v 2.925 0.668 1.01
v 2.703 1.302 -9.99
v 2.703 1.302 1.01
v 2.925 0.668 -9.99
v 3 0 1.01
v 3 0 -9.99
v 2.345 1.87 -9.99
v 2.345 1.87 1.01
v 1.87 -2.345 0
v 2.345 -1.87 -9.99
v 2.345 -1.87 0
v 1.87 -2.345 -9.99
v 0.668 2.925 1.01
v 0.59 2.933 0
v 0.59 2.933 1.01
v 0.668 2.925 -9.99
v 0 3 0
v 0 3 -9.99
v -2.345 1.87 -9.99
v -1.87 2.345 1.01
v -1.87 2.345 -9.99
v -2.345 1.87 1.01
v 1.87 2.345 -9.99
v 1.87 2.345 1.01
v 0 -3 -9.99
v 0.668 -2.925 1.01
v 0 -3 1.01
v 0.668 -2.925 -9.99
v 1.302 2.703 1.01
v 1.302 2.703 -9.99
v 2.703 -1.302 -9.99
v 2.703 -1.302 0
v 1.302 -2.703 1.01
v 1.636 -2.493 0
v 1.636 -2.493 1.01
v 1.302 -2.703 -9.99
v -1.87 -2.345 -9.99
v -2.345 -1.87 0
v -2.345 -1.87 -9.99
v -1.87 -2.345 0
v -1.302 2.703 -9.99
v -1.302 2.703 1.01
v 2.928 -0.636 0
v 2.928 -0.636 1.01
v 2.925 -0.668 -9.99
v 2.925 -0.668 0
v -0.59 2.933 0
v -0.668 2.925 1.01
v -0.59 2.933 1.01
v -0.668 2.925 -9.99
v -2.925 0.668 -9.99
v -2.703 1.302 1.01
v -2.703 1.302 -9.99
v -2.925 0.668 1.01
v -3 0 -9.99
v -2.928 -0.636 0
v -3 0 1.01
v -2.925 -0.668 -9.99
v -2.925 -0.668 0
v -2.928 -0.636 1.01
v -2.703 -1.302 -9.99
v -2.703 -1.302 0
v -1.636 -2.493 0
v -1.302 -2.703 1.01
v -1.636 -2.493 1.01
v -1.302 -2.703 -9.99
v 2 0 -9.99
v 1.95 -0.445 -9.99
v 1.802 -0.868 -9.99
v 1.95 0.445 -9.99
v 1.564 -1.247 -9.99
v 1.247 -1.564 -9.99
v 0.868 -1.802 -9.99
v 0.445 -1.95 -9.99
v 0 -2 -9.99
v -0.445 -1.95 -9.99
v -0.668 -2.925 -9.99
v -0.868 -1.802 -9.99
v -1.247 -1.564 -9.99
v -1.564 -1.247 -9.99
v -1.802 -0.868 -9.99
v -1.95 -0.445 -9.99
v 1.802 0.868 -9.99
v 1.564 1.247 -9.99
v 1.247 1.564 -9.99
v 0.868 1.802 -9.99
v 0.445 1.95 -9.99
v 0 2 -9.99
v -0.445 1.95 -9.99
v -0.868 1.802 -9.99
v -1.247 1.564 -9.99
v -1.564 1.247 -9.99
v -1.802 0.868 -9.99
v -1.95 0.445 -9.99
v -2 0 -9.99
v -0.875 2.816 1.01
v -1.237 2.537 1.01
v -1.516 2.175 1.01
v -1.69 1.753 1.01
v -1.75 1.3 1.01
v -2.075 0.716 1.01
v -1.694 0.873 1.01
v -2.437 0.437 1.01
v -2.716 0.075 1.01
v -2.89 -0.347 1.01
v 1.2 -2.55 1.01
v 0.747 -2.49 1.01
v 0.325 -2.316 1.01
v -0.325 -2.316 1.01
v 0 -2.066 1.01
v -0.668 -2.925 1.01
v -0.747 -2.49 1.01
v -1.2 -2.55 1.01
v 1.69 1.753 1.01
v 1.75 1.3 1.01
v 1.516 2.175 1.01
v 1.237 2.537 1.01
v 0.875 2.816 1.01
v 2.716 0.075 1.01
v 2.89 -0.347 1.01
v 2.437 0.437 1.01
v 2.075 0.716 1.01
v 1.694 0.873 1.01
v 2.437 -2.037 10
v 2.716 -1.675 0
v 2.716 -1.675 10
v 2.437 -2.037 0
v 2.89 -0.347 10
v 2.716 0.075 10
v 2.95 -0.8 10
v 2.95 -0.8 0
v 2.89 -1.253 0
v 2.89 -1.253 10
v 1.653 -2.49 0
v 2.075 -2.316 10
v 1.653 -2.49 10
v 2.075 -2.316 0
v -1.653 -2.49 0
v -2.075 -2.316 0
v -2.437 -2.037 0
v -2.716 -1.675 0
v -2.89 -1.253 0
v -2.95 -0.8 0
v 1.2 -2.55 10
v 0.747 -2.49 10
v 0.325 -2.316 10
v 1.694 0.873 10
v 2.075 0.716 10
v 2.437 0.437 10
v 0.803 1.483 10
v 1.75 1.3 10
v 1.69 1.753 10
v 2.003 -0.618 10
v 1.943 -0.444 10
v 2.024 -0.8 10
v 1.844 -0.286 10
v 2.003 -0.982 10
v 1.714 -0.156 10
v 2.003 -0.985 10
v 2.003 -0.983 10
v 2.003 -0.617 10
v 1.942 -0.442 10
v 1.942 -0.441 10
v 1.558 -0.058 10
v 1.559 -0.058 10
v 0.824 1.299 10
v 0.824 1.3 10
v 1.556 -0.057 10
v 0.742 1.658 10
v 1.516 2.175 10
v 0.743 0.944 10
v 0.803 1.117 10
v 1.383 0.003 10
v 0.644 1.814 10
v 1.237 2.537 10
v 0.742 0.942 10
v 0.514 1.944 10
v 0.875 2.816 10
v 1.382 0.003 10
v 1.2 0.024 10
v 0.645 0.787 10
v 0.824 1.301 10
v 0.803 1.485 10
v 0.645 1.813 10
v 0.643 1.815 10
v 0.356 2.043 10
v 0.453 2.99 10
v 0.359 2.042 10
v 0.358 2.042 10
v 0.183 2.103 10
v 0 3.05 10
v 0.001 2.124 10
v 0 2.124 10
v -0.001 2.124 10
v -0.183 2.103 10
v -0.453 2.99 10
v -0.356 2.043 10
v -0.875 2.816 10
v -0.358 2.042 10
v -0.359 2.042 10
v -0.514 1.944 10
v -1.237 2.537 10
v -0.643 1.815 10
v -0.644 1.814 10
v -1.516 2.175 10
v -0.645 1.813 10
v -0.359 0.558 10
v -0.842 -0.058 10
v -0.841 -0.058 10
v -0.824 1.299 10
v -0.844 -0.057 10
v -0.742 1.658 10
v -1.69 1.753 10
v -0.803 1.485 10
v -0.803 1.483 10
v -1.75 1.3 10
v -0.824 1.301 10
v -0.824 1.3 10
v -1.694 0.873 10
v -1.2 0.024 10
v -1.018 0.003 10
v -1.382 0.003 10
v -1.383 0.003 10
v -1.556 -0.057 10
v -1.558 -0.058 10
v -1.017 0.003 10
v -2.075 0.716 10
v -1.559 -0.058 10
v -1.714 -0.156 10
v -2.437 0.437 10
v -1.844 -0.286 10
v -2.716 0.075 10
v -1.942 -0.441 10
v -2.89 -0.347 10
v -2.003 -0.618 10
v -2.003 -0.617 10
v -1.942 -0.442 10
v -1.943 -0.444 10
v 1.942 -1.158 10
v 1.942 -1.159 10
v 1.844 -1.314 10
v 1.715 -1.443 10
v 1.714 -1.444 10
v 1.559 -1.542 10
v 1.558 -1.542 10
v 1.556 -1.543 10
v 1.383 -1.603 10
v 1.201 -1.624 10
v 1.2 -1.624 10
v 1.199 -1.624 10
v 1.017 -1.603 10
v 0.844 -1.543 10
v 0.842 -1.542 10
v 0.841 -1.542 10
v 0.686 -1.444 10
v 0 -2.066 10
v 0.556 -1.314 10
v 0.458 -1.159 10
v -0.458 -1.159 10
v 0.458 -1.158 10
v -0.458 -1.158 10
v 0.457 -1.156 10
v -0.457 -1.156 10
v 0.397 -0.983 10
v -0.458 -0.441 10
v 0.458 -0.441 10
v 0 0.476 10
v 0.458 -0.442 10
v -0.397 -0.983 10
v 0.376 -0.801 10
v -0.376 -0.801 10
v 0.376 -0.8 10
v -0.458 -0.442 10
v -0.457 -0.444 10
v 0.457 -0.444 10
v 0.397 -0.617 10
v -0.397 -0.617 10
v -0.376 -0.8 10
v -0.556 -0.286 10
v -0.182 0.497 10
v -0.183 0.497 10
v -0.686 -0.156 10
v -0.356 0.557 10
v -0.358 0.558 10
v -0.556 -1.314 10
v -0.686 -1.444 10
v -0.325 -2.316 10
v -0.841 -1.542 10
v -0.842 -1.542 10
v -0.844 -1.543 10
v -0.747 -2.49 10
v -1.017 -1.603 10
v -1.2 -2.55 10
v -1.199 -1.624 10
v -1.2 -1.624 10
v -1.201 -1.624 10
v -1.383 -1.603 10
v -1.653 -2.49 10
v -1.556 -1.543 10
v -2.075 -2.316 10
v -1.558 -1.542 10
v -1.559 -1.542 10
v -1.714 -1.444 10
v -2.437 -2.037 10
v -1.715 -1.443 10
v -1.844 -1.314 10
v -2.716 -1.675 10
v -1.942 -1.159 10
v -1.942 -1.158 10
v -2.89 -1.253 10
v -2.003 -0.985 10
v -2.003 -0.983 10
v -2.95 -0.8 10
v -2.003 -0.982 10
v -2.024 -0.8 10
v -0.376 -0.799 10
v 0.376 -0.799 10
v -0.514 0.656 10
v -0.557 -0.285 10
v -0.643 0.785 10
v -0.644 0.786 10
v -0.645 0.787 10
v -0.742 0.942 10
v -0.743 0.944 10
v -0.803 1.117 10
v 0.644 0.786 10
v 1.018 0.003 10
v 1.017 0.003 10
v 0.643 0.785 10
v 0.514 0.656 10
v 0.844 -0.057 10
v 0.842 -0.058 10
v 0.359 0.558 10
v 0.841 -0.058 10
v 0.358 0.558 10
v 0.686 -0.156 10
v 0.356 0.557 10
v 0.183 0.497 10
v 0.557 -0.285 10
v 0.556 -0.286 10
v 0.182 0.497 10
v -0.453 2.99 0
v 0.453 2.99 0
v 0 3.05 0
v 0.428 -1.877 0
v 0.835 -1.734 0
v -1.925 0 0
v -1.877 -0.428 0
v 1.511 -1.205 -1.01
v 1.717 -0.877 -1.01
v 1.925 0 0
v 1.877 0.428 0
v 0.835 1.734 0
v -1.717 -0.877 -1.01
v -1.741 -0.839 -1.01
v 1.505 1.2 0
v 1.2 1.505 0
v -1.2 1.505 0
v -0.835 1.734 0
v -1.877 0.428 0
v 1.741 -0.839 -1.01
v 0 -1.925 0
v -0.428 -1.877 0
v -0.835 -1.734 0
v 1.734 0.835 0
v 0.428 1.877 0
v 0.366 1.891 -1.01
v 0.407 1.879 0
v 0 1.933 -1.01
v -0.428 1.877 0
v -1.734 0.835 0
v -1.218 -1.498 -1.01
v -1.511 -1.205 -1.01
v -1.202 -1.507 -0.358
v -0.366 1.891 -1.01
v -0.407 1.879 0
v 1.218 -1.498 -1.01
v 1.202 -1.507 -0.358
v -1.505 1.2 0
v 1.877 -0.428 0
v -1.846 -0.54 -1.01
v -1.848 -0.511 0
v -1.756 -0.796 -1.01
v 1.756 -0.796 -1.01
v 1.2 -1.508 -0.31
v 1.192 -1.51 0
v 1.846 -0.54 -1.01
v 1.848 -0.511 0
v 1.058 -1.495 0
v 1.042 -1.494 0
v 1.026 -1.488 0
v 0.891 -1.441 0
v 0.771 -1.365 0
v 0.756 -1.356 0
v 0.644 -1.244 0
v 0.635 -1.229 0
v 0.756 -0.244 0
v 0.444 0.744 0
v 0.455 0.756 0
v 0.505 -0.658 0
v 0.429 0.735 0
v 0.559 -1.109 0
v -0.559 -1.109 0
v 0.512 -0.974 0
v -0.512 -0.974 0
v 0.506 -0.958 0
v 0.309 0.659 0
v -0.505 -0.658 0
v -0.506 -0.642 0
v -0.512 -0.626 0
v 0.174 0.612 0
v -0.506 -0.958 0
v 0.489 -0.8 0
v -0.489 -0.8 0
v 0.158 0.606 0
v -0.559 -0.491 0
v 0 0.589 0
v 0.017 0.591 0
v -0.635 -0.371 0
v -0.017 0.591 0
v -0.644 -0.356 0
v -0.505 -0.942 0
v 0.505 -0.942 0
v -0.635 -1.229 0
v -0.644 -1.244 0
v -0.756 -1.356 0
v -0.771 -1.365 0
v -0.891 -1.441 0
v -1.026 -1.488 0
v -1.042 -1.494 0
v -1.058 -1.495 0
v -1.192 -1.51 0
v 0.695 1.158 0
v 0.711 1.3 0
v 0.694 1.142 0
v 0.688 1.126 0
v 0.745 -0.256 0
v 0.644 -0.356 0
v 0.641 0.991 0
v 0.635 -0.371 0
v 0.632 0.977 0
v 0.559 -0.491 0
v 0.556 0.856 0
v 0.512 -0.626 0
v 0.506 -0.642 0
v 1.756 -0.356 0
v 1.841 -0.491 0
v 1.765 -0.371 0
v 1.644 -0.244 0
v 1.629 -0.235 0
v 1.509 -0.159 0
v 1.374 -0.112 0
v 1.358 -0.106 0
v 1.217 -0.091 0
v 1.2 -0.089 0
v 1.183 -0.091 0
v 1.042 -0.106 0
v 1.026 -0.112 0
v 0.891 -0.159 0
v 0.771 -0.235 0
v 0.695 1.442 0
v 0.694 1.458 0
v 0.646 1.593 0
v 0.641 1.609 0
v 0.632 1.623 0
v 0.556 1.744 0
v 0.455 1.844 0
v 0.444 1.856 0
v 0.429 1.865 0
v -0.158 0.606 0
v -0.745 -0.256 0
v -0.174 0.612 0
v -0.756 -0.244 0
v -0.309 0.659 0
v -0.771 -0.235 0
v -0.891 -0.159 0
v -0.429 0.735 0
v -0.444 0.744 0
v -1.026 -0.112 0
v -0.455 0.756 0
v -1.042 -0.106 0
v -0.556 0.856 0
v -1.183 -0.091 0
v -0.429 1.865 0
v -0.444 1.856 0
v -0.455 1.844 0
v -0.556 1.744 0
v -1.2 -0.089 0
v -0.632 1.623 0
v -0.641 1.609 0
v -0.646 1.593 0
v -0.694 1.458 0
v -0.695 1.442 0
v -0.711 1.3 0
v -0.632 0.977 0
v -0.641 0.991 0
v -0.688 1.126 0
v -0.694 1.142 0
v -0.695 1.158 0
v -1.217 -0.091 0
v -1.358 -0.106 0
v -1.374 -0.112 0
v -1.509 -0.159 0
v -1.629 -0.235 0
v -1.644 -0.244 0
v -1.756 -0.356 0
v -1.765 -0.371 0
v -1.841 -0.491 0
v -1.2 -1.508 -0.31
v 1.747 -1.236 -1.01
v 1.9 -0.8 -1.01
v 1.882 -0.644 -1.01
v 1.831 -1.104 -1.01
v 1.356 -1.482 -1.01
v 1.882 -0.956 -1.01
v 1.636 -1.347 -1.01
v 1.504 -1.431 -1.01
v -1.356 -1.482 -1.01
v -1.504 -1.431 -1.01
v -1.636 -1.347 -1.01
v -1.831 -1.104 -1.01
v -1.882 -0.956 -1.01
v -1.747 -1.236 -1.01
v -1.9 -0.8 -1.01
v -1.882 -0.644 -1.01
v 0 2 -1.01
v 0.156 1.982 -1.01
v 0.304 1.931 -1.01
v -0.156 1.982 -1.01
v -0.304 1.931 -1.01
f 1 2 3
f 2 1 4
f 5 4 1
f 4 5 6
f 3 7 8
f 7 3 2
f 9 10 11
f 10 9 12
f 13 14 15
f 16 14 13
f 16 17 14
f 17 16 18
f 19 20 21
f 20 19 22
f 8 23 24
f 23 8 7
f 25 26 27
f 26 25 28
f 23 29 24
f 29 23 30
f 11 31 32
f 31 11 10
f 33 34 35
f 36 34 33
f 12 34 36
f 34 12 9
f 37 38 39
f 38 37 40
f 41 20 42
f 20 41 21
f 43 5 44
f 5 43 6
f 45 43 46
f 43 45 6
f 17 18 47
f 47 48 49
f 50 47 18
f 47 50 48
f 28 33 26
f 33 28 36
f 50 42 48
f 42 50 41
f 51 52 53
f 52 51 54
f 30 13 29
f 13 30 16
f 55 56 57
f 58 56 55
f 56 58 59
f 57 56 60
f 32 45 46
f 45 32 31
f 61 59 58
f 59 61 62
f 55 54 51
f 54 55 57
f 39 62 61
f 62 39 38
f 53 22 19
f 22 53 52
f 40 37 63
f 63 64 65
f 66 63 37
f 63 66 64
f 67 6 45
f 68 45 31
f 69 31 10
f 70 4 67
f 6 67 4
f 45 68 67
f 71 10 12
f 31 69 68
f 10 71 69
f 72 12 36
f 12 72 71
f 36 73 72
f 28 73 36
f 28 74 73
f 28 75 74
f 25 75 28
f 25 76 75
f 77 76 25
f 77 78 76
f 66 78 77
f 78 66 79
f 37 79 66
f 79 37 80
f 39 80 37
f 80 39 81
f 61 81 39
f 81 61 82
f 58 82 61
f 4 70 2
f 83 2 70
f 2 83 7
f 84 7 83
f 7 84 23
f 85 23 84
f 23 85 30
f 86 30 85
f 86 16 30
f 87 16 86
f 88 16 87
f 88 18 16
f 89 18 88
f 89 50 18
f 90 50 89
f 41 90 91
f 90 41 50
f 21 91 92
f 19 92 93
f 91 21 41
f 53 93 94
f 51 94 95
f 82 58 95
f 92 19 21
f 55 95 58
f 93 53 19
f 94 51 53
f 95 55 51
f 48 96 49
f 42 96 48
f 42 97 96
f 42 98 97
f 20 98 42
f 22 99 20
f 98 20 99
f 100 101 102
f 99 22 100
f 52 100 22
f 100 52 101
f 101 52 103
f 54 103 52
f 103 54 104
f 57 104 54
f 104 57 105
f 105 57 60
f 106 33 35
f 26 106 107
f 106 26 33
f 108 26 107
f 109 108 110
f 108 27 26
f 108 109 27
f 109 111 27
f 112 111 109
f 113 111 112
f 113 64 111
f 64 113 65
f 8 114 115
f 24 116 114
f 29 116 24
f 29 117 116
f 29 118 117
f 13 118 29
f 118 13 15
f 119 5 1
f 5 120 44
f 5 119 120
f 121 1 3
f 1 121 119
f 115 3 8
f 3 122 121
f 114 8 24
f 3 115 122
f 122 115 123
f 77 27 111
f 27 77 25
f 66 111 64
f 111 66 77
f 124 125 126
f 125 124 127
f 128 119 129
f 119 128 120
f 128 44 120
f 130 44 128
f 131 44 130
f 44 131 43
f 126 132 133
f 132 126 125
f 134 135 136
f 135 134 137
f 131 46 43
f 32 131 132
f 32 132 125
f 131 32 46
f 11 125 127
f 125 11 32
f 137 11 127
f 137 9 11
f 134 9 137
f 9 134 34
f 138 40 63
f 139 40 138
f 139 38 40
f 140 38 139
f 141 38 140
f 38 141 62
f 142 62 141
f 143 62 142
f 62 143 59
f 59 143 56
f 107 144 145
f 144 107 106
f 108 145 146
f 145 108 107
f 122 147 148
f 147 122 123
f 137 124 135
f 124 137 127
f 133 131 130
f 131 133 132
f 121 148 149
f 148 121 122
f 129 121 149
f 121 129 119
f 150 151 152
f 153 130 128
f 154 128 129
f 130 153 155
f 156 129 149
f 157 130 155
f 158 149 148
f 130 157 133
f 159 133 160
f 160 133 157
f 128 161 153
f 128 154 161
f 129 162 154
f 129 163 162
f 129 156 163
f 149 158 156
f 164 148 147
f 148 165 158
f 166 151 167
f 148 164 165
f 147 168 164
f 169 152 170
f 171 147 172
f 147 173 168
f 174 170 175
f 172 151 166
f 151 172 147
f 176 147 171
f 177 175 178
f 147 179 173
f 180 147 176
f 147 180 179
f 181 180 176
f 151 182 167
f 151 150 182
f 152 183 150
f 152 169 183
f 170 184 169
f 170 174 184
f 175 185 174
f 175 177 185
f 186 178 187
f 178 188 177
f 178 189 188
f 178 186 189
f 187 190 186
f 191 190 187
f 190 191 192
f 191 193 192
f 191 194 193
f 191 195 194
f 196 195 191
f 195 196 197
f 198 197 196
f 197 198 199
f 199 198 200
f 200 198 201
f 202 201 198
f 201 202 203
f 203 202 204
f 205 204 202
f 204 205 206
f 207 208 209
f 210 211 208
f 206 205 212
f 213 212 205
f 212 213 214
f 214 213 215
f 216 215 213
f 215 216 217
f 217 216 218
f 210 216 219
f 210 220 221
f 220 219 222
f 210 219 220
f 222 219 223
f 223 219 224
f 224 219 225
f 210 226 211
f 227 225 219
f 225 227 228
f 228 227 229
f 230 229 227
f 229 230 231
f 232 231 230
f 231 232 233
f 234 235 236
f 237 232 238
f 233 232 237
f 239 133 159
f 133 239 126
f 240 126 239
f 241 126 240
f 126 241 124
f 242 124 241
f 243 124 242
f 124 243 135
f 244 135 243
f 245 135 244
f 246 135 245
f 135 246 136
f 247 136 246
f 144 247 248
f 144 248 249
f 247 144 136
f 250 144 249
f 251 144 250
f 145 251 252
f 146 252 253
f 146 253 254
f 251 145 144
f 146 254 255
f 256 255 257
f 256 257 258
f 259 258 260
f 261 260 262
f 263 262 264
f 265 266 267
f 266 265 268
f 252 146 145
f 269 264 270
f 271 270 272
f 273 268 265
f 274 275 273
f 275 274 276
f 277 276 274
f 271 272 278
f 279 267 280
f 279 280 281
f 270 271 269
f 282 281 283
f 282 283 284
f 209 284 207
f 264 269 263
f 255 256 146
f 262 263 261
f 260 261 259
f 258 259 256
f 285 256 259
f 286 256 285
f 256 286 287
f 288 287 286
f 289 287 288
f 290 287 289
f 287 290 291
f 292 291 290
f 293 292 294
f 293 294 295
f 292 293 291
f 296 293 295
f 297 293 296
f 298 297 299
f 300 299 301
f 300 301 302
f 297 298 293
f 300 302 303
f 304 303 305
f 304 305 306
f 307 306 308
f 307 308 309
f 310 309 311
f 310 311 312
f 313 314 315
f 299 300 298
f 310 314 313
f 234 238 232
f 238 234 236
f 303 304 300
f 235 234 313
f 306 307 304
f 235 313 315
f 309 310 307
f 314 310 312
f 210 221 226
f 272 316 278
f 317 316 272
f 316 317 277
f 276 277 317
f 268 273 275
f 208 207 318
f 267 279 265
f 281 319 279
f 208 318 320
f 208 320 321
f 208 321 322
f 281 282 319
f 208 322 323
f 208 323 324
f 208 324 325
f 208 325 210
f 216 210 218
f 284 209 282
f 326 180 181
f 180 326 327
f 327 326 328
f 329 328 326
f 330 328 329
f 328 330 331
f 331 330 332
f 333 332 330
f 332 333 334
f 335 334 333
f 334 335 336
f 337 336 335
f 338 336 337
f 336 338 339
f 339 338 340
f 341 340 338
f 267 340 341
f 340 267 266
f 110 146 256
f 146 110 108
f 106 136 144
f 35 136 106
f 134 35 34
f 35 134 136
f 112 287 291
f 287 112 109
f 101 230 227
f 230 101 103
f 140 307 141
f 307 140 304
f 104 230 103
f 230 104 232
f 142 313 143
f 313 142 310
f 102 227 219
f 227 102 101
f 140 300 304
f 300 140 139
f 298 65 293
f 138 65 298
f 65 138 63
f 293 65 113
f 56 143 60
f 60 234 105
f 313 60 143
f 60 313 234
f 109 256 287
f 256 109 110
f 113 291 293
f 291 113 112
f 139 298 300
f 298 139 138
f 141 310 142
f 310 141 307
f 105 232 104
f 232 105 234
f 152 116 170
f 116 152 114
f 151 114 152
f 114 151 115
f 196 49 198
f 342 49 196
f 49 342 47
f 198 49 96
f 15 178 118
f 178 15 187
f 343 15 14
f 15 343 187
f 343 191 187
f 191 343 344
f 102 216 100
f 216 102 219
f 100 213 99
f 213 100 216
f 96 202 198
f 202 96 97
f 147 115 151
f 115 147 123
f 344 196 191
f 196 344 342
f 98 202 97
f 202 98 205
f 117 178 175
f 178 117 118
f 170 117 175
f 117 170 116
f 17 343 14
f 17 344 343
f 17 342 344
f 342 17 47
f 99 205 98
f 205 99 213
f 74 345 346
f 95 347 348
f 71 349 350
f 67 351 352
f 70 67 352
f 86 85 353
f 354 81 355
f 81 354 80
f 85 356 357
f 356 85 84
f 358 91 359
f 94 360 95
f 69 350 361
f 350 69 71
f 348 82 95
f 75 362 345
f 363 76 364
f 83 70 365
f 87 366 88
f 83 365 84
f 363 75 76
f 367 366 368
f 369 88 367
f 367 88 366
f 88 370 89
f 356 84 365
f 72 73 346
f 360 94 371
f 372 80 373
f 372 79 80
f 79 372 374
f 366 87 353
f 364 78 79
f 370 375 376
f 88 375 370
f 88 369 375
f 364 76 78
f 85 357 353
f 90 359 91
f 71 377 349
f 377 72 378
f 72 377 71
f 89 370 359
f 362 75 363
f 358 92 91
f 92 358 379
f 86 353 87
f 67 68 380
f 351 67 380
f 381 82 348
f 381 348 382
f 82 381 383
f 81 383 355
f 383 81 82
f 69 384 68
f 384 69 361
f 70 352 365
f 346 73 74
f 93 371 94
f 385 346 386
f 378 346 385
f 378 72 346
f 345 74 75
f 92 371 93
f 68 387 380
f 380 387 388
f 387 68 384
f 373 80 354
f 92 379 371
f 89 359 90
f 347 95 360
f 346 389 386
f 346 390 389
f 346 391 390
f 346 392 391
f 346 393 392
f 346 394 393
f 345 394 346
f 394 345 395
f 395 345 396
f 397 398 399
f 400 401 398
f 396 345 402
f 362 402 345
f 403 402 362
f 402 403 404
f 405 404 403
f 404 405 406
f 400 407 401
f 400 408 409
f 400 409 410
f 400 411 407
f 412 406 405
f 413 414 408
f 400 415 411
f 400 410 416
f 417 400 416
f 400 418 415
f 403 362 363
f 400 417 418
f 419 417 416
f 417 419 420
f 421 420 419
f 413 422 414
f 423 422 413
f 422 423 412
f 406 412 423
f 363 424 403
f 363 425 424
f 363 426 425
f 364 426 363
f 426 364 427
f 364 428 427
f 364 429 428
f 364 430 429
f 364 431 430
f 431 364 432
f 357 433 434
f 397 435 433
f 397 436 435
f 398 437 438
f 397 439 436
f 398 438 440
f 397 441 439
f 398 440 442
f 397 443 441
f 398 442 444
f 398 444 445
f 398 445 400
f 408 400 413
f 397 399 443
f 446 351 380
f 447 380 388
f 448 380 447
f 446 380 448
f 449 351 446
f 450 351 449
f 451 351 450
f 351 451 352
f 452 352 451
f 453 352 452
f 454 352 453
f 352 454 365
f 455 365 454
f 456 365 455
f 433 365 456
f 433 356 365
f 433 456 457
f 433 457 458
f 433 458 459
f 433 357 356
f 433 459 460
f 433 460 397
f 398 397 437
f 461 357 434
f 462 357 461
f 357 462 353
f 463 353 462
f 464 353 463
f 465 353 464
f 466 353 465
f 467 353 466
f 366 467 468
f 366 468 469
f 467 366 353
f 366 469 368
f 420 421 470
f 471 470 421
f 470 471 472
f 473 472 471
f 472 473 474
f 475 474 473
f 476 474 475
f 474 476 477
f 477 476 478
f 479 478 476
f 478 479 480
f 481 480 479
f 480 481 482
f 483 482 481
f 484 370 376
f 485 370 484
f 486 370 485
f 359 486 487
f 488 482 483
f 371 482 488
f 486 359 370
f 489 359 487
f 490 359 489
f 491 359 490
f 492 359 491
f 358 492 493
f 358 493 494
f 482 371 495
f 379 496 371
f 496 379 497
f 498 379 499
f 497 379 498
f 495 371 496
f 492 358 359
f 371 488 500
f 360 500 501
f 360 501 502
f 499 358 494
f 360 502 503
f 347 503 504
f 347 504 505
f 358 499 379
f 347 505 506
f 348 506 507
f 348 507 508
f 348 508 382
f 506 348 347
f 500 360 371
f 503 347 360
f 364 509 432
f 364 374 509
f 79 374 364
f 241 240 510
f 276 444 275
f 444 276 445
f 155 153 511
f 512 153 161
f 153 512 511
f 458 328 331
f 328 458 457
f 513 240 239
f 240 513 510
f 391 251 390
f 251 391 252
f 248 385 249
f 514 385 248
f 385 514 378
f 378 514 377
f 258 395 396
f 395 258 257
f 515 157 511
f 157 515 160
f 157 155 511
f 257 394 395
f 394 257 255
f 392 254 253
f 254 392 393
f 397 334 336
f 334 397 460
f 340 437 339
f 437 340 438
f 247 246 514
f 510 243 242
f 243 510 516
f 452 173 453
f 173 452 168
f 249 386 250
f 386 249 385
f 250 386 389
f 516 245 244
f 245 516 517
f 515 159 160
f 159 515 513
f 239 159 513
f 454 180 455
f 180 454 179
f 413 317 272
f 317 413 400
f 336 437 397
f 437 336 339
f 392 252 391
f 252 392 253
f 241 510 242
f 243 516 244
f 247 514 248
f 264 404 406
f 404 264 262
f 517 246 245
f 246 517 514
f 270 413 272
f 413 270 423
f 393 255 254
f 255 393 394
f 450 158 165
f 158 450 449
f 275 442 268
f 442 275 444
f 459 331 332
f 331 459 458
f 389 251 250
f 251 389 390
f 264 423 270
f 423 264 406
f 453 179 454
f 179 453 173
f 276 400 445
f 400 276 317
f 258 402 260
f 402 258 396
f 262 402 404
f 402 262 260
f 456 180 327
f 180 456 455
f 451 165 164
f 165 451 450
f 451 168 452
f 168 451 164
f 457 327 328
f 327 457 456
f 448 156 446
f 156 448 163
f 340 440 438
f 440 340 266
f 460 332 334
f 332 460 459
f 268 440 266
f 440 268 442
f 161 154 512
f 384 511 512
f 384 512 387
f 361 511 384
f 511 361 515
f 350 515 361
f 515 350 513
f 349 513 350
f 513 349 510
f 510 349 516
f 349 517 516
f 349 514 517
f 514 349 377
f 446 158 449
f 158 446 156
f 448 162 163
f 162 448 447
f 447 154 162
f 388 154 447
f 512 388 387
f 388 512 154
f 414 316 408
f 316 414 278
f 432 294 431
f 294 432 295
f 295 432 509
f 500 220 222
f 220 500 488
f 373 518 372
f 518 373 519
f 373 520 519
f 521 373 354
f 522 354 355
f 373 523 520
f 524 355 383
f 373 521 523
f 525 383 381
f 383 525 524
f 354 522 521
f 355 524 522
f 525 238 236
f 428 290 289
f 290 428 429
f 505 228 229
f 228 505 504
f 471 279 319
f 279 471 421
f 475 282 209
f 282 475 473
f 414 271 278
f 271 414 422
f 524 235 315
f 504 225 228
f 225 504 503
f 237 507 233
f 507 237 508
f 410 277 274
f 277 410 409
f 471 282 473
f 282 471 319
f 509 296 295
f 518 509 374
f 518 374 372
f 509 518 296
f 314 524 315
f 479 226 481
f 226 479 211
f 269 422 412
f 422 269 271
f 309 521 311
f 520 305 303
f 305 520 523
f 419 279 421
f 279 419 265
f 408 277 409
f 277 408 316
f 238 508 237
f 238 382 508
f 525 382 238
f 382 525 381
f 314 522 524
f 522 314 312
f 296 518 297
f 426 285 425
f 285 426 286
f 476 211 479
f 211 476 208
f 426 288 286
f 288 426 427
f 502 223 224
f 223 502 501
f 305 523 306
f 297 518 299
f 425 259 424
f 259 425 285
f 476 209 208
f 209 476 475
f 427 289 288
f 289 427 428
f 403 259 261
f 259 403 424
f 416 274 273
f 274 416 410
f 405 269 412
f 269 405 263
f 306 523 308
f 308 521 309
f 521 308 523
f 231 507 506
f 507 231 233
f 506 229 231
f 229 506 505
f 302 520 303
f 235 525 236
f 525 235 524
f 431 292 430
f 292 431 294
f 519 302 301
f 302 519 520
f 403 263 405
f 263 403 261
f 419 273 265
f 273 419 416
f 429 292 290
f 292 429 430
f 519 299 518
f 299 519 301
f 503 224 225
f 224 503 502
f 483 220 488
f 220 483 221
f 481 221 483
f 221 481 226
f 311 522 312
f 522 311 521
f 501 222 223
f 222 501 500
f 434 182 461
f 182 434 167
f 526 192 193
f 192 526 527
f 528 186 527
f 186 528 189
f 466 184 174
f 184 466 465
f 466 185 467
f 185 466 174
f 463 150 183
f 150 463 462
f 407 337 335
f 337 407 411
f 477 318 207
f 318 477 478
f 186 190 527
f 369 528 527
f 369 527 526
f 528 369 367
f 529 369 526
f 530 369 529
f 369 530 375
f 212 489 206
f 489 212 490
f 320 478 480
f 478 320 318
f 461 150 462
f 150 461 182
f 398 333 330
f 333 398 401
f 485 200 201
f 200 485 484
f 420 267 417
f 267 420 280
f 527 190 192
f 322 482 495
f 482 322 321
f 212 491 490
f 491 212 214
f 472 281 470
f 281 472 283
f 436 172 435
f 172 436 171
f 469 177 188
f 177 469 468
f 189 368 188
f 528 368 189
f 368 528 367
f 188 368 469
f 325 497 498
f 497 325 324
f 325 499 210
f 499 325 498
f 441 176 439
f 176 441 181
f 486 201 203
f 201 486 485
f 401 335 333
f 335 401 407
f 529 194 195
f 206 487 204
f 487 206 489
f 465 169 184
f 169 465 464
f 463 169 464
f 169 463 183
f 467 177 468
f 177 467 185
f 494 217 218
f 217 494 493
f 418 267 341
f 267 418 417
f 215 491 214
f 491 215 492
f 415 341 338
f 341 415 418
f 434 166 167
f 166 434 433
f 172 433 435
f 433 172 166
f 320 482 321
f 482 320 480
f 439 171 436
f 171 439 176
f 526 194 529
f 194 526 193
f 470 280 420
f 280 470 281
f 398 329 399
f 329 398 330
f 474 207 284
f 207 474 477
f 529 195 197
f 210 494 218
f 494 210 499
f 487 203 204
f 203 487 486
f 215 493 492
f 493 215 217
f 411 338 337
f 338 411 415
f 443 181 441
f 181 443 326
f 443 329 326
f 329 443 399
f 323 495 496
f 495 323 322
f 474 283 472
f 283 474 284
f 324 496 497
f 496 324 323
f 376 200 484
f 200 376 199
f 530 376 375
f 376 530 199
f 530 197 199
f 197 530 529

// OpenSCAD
module tube1(){
    difference(){
        union(){
            translate([0,0,-9.99])
                cylinder(d=6,h=11,$fn=28);
                
            cylinder(d=3.5,h=10,$fn=24);
        }
        translate([0,0,-10])
            cylinder(d1=4,d2=3.85,h=10,$fn=28);
        
        translate([0,0,-1.01])
            cylinder(d1=1.4,d2=1.55,h=11.1,$fn=28);
    }
}

module tube2(){
    bias=1.2;
    difference(){
        union(){
            translate([0,0,-9.99])
                cylinder(d=6,h=11,$fn=28);
            translate([bias,-0.8,0])    
                cylinder(d=3.5,h=10,$fn=24);
            translate([-bias,-0.8,0])    
                cylinder(d=3.5,h=10,$fn=24);
            translate([0,1.3,0])    
                cylinder(d=3.5,h=10,$fn=24);
        }
        translate([0,0,-10])
            cylinder(d1=4,d2=3.85,h=10,$fn=28);
        
        translate([bias,-0.8,-1.01])
            cylinder(d1=1.4,d2=1.65,h=11.1,$fn=28);
        translate([-bias,-0.8,-1.01])
            cylinder(d1=1.4,d2=1.65,h=11.1,$fn=28);
        translate([0,1.3,-1.01])
            cylinder(d1=1.4,d2=1.65,h=11.1,$fn=28);
    }
}

//tube1();
tube2();
